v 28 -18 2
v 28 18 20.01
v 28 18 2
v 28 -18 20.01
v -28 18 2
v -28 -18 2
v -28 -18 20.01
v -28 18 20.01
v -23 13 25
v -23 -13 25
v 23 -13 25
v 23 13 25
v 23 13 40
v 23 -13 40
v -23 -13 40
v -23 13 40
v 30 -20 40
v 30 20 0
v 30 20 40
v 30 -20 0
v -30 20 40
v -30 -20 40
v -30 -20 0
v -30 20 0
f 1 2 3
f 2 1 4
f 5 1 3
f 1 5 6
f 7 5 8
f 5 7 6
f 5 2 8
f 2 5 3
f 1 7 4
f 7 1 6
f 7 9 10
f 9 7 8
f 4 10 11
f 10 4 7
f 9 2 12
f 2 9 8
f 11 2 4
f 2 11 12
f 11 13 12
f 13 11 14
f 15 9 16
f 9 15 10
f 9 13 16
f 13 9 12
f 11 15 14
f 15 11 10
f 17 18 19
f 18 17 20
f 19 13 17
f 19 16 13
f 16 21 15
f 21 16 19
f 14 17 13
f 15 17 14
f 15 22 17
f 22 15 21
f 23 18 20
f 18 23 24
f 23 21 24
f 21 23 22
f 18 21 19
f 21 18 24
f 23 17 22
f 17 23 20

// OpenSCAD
// Open-top enclosure with a PCB ledge whose underside is a 45-degree chamfer
// (the support-free answer; a flat slab ledge would be a horizontal overhang).
$fn = 96;
wall = 2; ledge_top = 25; ledge_depth = 5;
outer = [60, 40, 40];
inner = [outer[0] - 2 * wall, outer[1] - 2 * wall];
difference() {
    translate([-outer[0] / 2, -outer[1] / 2, 0]) cube(outer);
    union() {
        translate([-inner[0] / 2, -inner[1] / 2, wall]) cube([inner[0], inner[1], ledge_top - ledge_depth - wall + 0.01]);
        hull() {
            translate([-inner[0] / 2, -inner[1] / 2, ledge_top - ledge_depth]) cube([inner[0], inner[1], 0.01]);
            translate([-inner[0] / 2 + ledge_depth, -inner[1] / 2 + ledge_depth, ledge_top - 0.01])
                cube([inner[0] - 2 * ledge_depth, inner[1] - 2 * ledge_depth, 0.01]);
        }
        translate([-inner[0] / 2 + ledge_depth, -inner[1] / 2 + ledge_depth, ledge_top - 0.02])
            cube([inner[0] - 2 * ledge_depth, inner[1] - 2 * ledge_depth, outer[2]]);
    }
}
